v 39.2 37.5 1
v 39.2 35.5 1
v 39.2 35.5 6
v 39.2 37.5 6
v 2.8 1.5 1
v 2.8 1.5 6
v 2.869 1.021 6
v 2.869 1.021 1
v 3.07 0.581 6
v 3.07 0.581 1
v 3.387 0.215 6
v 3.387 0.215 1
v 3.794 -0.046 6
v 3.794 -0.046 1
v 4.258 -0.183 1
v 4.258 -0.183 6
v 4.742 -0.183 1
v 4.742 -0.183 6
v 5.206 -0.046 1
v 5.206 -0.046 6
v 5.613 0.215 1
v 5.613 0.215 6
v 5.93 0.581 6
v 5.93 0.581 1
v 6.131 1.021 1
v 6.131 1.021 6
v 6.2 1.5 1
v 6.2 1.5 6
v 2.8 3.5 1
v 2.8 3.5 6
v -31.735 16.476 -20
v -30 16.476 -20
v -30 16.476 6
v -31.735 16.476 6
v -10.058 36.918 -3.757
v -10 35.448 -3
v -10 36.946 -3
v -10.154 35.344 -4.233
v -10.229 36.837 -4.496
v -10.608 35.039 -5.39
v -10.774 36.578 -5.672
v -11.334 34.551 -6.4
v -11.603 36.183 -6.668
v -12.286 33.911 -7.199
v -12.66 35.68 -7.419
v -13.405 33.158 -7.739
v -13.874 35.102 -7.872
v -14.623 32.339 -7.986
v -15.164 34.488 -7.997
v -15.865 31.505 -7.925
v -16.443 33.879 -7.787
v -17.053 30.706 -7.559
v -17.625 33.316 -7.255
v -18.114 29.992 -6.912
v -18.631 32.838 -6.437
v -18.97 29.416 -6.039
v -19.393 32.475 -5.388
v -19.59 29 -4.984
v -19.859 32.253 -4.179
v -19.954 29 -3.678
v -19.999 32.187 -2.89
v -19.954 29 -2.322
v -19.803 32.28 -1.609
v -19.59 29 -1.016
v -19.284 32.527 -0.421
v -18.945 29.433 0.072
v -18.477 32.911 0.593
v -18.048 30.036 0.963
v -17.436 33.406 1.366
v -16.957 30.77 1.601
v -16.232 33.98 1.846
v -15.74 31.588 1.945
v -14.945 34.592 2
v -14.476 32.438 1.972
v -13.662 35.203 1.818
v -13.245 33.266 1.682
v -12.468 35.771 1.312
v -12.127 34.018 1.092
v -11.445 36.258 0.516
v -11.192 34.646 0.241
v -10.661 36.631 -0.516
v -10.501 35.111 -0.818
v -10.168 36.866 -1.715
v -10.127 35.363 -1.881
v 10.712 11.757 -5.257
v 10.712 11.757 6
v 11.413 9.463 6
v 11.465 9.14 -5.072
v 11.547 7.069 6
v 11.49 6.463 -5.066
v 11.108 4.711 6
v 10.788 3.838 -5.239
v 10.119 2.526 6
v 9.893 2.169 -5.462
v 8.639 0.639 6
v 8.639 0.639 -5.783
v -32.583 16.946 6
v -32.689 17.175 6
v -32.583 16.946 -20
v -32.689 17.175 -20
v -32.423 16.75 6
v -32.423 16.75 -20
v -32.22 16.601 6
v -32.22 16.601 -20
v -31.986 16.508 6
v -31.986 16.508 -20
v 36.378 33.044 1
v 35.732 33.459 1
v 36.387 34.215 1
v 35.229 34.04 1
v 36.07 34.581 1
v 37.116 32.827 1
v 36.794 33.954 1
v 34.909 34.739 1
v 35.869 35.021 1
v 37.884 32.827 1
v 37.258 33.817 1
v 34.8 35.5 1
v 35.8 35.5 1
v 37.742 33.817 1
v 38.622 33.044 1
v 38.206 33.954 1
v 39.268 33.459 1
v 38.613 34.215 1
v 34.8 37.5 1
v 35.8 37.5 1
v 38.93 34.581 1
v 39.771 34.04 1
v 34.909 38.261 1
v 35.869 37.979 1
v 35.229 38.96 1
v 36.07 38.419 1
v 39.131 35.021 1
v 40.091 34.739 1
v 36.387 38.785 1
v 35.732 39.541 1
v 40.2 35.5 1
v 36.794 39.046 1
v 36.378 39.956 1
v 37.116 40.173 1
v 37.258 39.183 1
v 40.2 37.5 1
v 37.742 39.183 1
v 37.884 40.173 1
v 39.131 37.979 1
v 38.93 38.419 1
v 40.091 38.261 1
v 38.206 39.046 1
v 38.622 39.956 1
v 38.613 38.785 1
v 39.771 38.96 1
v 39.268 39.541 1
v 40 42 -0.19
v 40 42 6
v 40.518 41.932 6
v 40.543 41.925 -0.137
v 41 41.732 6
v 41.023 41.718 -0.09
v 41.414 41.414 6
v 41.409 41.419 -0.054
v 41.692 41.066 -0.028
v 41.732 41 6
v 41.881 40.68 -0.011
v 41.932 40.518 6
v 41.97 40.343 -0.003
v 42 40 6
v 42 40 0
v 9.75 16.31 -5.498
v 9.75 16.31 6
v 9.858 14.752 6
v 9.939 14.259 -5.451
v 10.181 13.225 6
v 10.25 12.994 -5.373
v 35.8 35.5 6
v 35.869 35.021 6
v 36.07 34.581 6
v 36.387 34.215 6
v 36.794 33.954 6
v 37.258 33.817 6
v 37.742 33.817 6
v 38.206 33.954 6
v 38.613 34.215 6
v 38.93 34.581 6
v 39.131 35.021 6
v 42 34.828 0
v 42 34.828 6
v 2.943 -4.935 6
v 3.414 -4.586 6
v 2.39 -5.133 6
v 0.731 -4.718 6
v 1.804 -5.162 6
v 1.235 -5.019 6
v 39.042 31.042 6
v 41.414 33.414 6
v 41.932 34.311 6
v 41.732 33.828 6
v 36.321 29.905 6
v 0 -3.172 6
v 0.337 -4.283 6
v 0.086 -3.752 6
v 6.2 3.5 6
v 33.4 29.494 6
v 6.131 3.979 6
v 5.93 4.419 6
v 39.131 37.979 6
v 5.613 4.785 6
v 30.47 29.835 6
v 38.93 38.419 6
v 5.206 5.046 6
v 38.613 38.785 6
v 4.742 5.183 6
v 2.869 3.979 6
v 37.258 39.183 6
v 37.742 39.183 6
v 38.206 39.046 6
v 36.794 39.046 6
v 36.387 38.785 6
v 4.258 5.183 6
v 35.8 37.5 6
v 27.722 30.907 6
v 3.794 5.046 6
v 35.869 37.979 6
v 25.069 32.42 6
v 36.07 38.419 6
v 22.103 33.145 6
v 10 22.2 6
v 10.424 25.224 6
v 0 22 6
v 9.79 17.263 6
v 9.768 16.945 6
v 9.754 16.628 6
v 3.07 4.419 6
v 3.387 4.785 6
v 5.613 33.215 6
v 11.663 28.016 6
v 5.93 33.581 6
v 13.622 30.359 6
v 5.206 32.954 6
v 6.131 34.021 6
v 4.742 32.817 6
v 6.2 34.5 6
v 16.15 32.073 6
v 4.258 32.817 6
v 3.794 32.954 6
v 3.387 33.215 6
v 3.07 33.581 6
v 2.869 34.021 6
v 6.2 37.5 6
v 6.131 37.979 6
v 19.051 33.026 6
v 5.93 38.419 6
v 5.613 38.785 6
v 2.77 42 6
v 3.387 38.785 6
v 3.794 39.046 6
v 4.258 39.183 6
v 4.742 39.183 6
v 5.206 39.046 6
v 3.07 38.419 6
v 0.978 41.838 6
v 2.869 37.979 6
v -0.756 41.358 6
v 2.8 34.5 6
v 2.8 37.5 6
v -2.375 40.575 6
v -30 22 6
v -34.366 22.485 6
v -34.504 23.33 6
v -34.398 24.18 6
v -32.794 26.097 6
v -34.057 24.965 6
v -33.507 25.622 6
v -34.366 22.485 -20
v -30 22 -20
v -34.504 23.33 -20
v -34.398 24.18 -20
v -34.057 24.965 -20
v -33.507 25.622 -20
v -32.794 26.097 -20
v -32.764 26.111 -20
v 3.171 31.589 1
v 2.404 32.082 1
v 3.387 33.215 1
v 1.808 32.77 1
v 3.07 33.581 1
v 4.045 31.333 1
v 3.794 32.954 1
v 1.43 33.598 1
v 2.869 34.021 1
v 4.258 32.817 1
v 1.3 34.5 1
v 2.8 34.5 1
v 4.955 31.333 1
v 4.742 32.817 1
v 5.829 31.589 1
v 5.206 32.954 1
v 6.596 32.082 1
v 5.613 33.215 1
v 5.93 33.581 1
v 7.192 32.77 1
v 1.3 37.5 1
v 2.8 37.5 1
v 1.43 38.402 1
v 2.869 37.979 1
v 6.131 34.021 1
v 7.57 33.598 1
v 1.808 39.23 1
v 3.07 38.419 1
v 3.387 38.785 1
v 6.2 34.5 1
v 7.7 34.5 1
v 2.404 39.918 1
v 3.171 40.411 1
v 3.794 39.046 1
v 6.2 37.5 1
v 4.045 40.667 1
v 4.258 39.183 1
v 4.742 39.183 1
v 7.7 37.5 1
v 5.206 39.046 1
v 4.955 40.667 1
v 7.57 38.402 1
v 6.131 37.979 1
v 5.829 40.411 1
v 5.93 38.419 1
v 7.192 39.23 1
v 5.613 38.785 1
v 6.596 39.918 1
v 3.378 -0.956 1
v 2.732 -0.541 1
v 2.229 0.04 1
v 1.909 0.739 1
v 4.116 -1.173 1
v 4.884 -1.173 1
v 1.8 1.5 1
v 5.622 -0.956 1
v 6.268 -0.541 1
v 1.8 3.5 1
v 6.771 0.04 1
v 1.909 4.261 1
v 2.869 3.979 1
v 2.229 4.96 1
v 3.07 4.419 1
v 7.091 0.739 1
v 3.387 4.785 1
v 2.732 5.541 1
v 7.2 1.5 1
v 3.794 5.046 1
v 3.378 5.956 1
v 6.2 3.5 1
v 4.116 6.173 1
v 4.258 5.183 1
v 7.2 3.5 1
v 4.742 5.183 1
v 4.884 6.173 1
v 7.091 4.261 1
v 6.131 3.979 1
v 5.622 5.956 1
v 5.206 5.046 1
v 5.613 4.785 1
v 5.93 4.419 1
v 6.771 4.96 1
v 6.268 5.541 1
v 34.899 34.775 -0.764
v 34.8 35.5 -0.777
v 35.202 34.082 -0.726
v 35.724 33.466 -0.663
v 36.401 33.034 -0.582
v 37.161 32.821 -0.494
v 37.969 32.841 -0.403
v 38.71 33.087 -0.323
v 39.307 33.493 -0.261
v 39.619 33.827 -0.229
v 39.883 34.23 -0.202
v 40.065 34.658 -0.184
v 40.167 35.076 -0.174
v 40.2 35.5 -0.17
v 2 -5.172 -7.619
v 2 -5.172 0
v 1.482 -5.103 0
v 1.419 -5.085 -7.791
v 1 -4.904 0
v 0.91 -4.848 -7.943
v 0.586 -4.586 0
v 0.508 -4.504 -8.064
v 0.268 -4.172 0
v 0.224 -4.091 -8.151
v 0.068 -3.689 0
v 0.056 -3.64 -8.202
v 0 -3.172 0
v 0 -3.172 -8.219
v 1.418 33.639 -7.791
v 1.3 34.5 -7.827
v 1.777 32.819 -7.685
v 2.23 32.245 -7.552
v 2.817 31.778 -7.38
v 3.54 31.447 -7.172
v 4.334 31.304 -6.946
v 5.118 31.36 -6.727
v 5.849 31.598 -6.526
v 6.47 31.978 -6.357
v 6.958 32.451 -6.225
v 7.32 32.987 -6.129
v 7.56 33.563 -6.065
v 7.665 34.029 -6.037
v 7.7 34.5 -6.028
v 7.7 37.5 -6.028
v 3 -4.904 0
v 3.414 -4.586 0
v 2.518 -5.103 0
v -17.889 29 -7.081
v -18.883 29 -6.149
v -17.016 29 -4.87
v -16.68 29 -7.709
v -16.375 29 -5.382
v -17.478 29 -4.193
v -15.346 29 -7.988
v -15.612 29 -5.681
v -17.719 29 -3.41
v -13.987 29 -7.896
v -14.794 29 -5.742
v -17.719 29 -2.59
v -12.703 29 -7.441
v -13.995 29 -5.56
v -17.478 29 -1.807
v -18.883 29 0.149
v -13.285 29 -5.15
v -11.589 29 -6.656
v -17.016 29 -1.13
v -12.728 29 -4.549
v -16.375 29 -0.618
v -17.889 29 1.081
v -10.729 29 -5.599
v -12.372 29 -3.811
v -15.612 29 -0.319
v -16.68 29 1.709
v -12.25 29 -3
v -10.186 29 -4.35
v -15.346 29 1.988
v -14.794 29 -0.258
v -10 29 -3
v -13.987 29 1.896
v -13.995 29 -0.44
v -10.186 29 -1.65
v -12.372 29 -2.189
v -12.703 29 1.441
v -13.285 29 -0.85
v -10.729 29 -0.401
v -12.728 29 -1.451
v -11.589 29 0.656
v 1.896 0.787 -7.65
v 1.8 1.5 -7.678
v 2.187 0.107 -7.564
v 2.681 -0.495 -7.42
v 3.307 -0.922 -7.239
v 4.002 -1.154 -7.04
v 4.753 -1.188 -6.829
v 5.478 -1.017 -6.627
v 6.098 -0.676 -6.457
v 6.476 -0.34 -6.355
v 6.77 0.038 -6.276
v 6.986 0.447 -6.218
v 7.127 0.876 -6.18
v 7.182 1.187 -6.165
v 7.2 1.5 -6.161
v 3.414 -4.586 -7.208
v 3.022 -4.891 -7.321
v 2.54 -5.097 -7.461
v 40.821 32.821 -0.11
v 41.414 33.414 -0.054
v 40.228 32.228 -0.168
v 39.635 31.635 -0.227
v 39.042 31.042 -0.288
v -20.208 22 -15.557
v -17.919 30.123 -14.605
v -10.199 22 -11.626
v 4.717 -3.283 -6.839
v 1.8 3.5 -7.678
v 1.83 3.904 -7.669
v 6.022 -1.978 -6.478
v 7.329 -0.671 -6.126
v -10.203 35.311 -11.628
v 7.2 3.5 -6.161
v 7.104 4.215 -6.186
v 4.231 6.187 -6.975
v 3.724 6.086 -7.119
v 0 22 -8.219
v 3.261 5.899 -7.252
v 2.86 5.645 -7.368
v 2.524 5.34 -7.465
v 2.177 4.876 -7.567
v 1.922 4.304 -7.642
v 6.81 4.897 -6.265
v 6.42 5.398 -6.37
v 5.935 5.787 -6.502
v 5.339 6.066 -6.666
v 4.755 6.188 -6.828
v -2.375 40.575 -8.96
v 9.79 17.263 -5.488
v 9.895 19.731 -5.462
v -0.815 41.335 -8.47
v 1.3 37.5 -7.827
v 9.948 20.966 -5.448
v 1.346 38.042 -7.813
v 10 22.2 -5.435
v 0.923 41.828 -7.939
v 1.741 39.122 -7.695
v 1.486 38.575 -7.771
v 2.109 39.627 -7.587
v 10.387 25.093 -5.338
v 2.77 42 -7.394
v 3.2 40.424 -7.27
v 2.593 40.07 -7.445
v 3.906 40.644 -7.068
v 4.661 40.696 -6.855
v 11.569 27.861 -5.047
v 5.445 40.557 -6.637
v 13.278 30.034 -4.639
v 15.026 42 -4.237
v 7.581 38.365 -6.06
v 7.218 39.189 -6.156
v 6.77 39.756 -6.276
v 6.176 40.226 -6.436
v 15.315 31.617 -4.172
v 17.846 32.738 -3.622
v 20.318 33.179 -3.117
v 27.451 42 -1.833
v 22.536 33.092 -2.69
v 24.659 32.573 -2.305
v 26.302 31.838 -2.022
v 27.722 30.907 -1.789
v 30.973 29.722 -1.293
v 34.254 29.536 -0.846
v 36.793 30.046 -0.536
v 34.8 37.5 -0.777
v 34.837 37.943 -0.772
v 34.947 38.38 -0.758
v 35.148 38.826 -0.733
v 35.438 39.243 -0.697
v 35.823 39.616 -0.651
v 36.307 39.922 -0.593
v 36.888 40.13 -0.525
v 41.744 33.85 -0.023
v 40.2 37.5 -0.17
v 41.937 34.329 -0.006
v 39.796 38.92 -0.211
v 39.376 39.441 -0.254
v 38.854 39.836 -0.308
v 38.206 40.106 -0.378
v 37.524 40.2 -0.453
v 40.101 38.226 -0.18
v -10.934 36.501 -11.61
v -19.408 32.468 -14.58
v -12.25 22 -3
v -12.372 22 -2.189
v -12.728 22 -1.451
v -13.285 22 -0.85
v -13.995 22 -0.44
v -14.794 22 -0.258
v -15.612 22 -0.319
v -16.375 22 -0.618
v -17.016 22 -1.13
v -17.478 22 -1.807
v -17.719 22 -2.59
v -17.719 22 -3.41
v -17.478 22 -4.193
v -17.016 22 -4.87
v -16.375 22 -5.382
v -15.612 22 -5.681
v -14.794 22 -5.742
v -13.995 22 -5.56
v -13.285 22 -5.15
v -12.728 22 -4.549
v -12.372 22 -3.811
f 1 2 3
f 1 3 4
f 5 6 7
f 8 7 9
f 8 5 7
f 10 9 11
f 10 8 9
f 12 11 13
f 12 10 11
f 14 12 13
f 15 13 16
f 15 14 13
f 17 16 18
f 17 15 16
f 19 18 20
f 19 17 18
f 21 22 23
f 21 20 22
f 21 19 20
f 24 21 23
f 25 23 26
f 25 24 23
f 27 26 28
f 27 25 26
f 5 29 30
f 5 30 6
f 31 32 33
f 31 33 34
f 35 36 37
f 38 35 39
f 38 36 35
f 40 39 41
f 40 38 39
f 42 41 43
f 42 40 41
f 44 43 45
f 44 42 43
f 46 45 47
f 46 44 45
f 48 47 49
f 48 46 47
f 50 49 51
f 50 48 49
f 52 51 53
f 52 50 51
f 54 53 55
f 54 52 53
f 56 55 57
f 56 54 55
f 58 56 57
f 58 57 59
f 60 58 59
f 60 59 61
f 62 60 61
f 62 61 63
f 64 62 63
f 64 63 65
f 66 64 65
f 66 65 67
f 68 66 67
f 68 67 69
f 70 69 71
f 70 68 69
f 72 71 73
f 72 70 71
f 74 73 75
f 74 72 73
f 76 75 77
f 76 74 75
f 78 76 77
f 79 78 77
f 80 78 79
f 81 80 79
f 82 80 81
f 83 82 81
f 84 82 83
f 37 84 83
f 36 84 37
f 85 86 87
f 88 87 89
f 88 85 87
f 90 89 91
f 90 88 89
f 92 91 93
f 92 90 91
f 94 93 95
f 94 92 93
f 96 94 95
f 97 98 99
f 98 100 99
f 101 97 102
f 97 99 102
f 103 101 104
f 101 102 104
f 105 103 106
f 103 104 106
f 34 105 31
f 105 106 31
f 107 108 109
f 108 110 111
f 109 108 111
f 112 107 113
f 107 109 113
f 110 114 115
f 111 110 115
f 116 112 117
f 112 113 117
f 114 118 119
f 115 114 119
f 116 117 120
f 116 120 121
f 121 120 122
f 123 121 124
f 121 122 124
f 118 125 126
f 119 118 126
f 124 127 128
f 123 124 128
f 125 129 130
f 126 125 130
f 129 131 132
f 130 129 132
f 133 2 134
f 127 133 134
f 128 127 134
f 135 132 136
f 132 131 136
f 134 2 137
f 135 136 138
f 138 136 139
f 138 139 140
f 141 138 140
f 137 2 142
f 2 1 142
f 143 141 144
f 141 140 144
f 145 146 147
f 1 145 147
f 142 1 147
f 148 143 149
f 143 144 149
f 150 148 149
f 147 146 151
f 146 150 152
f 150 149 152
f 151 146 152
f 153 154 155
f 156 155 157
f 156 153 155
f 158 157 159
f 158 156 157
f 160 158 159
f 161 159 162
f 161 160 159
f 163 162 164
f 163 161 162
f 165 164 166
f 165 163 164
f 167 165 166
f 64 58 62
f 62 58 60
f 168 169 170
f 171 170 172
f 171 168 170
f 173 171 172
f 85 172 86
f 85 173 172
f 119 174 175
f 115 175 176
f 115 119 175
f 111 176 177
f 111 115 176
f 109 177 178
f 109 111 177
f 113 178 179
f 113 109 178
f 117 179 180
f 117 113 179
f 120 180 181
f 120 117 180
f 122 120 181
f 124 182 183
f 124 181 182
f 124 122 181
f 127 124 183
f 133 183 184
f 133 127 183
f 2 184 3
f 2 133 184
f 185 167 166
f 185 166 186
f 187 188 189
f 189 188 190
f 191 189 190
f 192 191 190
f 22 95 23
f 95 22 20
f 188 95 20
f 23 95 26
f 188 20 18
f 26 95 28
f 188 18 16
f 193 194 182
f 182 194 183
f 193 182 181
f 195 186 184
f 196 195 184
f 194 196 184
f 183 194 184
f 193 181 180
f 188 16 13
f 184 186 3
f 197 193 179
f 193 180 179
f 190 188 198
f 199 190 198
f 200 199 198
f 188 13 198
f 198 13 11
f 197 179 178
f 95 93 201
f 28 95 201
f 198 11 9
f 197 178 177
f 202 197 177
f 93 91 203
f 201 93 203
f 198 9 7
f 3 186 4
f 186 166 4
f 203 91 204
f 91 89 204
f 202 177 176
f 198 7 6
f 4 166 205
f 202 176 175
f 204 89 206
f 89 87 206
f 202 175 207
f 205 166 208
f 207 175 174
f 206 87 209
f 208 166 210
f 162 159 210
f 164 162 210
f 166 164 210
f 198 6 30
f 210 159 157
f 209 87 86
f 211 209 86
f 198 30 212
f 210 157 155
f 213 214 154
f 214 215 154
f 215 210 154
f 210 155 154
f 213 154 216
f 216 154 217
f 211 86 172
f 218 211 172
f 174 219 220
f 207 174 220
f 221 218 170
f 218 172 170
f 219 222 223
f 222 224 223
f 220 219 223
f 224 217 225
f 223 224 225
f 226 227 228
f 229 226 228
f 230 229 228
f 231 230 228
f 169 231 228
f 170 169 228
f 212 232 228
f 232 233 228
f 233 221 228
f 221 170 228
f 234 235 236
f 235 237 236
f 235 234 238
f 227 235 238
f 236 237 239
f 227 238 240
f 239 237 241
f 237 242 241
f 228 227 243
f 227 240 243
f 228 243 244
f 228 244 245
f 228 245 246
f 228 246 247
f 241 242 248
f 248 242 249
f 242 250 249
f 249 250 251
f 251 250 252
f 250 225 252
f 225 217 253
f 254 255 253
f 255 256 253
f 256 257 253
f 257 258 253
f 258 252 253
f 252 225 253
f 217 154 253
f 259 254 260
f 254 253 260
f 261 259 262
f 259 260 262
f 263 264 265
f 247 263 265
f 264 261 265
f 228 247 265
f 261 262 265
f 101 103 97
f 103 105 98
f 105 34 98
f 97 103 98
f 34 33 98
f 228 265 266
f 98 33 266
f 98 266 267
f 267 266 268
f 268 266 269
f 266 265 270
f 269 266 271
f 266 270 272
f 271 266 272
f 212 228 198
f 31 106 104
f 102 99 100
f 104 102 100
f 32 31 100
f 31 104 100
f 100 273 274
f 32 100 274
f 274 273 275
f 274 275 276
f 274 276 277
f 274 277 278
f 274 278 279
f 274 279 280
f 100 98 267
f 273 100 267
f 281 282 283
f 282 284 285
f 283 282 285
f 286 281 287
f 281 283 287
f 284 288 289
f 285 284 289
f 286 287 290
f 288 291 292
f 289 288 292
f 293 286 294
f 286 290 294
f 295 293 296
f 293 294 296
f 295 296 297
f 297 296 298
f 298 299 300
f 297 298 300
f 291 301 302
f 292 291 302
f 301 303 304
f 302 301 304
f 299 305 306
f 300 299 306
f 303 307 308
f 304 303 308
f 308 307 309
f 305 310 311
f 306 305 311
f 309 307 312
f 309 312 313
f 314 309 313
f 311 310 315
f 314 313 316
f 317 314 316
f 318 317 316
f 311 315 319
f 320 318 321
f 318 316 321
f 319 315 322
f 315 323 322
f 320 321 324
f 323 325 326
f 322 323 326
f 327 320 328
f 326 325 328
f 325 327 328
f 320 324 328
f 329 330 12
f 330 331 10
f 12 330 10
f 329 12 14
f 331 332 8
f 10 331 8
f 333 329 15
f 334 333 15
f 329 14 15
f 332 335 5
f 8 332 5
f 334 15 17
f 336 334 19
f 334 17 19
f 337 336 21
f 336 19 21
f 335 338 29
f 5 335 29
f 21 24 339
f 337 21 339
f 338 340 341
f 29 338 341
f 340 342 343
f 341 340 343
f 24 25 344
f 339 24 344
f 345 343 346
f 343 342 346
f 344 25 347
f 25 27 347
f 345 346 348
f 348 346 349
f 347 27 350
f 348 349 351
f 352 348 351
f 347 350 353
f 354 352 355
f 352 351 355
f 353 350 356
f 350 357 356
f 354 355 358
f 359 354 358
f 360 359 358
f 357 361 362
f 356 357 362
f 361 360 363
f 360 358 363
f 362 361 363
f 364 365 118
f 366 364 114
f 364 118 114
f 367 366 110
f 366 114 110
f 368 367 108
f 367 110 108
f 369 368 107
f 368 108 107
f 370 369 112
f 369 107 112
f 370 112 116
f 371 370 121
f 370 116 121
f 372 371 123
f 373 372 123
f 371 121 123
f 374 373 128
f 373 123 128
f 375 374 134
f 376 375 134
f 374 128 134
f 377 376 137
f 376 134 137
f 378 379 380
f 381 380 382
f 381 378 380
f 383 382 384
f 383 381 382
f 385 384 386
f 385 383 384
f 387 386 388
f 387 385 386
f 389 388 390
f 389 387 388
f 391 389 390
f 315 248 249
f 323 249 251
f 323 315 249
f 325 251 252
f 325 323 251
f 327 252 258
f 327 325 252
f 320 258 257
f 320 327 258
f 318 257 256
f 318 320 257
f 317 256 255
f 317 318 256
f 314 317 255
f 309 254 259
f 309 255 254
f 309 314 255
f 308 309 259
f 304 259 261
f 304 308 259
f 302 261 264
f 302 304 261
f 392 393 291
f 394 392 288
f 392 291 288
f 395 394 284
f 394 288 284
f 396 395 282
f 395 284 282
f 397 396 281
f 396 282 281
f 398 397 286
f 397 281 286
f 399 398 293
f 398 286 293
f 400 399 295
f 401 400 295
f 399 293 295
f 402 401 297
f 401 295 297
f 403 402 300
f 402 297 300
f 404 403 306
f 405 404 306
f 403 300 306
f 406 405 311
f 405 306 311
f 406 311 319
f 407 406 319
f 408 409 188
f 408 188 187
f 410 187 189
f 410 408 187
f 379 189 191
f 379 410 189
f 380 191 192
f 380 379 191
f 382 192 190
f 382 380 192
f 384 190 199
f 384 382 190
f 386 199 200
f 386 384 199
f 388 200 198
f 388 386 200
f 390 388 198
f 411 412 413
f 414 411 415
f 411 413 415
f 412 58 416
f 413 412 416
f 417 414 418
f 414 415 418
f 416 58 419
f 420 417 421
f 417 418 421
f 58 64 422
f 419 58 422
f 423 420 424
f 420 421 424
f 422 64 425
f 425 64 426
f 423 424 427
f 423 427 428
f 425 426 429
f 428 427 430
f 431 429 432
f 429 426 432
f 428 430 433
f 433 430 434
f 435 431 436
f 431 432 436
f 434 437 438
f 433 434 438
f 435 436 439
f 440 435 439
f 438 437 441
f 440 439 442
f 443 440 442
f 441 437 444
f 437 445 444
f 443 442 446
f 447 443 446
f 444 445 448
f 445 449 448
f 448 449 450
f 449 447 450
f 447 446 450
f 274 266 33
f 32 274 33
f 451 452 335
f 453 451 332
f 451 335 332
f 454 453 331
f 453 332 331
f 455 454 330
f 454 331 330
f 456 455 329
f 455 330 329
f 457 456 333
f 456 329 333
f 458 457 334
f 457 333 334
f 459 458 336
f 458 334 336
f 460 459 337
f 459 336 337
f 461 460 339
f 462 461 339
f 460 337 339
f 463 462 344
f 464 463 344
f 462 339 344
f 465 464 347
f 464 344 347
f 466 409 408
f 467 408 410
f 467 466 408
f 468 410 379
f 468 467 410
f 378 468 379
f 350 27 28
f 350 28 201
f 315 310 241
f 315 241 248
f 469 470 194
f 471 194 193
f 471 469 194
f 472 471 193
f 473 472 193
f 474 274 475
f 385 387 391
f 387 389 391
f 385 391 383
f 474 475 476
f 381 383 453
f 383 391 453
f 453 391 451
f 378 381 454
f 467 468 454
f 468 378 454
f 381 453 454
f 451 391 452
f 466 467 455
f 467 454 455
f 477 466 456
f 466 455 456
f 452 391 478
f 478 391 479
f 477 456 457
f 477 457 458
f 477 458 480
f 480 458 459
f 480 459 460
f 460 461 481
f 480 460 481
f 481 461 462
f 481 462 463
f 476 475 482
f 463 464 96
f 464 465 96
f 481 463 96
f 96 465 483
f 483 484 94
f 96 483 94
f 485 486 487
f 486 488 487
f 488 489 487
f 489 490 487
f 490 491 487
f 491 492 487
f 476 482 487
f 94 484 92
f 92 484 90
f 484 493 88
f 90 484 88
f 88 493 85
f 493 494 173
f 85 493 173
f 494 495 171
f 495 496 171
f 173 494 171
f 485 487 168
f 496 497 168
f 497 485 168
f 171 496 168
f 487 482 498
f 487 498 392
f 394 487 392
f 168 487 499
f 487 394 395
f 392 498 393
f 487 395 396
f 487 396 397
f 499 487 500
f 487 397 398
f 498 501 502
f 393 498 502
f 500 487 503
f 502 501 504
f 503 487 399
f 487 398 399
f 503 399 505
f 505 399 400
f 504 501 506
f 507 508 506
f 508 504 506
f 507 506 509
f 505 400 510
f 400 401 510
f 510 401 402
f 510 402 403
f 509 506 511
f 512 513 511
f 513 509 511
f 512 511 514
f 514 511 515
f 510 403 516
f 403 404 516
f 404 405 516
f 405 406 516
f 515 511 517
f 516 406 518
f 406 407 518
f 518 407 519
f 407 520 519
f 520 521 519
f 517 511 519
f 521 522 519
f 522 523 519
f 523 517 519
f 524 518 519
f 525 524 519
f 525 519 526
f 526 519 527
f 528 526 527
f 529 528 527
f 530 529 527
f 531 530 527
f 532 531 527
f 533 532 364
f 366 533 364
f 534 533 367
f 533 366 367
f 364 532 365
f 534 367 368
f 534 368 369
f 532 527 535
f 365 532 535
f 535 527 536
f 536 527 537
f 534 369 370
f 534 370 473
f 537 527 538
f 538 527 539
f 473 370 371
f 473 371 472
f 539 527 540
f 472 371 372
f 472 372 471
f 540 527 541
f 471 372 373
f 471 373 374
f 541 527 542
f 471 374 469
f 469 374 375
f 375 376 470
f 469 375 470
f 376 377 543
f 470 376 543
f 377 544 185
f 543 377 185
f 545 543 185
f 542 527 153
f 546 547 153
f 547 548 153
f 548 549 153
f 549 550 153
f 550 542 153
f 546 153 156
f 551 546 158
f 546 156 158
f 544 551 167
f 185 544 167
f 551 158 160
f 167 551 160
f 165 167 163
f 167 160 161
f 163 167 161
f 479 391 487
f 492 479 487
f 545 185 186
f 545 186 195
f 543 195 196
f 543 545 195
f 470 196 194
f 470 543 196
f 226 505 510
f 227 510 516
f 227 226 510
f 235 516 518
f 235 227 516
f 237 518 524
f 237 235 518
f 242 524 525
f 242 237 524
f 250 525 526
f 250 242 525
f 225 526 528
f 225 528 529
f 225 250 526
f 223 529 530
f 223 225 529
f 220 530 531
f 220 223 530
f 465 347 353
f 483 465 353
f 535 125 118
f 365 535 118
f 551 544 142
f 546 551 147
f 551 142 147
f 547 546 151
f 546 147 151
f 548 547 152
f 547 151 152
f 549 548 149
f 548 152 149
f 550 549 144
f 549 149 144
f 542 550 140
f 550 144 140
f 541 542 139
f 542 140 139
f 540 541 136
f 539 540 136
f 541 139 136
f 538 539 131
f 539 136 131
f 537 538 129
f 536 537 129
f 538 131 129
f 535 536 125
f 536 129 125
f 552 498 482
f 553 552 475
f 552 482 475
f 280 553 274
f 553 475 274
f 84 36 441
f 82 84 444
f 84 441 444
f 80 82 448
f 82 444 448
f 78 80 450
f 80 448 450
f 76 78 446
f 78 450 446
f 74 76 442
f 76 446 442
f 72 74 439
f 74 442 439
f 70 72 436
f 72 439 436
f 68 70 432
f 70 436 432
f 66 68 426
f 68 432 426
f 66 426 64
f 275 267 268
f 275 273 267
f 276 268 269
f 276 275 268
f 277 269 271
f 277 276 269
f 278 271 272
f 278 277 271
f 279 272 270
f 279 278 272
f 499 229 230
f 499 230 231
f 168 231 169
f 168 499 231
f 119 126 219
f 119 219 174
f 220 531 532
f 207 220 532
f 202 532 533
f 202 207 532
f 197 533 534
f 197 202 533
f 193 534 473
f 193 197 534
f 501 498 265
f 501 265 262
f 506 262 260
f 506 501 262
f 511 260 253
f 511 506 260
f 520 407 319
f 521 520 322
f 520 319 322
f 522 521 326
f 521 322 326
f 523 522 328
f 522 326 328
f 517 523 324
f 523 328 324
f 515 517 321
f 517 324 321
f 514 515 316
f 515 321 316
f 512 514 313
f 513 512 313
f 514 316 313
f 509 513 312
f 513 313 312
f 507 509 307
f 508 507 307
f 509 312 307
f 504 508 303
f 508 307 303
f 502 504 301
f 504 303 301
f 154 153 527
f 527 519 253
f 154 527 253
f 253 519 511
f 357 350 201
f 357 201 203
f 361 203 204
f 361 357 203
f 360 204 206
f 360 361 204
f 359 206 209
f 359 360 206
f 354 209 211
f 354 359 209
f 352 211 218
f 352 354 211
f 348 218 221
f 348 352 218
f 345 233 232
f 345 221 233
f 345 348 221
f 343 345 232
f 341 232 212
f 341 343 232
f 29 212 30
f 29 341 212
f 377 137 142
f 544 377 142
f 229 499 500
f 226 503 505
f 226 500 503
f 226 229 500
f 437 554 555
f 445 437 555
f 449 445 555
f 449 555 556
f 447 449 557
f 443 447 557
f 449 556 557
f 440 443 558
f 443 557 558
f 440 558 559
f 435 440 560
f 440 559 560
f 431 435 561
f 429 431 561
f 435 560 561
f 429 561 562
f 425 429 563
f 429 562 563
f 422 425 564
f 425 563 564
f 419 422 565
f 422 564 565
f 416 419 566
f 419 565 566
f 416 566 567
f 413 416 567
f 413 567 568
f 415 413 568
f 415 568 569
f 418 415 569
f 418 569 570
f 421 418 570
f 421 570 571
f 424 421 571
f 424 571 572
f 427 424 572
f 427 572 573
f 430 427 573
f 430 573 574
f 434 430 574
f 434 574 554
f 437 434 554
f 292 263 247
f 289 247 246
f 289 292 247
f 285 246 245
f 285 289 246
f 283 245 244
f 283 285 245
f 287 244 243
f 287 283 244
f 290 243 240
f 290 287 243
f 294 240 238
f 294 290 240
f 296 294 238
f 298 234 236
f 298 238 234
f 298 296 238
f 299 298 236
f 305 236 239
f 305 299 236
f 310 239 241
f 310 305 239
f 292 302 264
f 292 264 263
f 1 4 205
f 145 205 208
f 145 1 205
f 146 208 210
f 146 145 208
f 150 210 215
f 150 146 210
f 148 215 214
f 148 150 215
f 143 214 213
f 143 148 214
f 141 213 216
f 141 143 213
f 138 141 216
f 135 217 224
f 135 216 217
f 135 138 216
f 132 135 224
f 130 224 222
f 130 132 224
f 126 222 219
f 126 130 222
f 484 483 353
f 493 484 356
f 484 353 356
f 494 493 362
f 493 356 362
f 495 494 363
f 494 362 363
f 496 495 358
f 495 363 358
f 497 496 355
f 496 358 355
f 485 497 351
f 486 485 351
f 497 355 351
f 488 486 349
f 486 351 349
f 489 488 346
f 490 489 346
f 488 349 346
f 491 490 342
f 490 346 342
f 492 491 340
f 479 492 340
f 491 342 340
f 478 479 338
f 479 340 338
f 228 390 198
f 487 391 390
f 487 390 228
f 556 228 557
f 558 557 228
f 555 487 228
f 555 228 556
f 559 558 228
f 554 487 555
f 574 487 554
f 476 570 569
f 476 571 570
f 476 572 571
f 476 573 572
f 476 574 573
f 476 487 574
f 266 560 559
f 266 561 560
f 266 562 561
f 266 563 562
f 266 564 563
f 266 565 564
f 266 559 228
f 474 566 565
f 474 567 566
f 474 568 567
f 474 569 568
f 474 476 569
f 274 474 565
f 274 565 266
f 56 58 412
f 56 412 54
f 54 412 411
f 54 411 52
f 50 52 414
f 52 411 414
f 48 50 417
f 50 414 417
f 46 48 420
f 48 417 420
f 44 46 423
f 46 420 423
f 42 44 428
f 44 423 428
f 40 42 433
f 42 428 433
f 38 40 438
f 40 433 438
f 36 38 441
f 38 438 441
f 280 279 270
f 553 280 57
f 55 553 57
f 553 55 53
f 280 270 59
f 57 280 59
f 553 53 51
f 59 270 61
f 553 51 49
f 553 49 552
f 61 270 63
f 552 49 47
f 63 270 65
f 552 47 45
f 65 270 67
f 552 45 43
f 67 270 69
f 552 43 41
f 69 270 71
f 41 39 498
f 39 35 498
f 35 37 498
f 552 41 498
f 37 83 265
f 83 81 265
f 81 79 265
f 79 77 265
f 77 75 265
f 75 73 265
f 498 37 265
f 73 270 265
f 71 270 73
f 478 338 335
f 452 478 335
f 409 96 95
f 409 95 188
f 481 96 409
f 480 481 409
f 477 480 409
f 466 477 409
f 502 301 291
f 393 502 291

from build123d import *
from build123d.topology import SkipClean

# Parameters (mm, degrees)
RESSALTO_EXTRUS_O1_DEPTH = 6
RESSALTO_EXTRUS_O2_DEPTH = 47.171573
CORTE_EXTRUS_O1_START    = -36
CORTE_EXTRUS_O1_DEPTH    = 36
CORTE_EXTRUS_O2_START    = -6
CORTE_EXTRUS_O2_DEPTH    = 6
CORTE_EXTRUS_O3_DEPTH    = 64.000000167
ESBO_O6_R                = 2.75
CORTE_EXTRUS_O4_DEPTH    = 54.872946739
ESBO_O7_R                = 5
CORTE_EXTRUS_O5_DEPTH    = 16
RESSALTO_EXTRUS_O3_DEPTH = 56
CORTE_EXTRUS_O6_DEPTH    = 56
ESBO_O10_W               = 30
ESBO_O10_H               = 4.954017116
CORTE_EXTRUS_O7_DEPTH    = 56
ESBO_O11_W               = 2.729993951
ESBO_O11_H               = 30
CORTE_EXTRUS_O8_DEPTH    = 56
ESBO_O12_W               = 4.187219241
ESBO_O12_H               = 30
CORTE_EXTRUS_O9_DEPTH    = 56
ESBO_O13_R               = 7.968110823
CORTE_EXTRUS_O10_DEPTH   = 56
FILETE1_R                = 3
FILETE2_R                = 1
ESBO_O14_R               = 5
CORTE_EXTRUS_O11_DEPTH   = 56
CORTE_EXTRUS_O12_DEPTH   = 65.838260479


with BuildPart() as part:
    # Esboço1 → Ressalto-extrusão1 (new body)
    with BuildSketch(Plane.XY):
        with BuildLine():
            Line((-30, 24), (-2.375117905, 40.574929257))
            ThreePointArc((-2.375117905, 40.574929257), (0.100503831, 41.637149282), (2.769839649, 42))
            Line((2.769839649, 42), (40, 42))
            ThreePointArc((40, 42), (41.414213562, 41.414213562), (42, 40))
            Line((42, 40), (42, 34.828427125))
            ThreePointArc((42, 34.828427125), (41.847759065, 34.06306026), (41.414213562, 33.414213562))
            Line((41.414213562, 33.414213562), (36.670641482, 28.670641482))
            ThreePointArc((36.670641482, 28.670641482), (31.432958847, 25.911210894), (25.552715472, 26.597151419))
            ThreePointArc((25.552715472, 26.597151419), (13.045048712, 24.264475098), (10.712372391, 11.756808337))
            ThreePointArc((10.712372391, 11.756808337), (11.398312916, 5.876564962), (8.638882328, 0.638882328))
            Line((8.638882328, 0.638882328), (8, 0))
            Line((8, 0), (6.2, -1.8))
            Line((6.2, -1.8), (3.414213562, -4.585786438))
            ThreePointArc((3.414213562, -4.585786438), (1.234633135, -5.01933194), (0, -3.171572875))
            Line((0, -3.171572875), (0, 0))
            Line((0, 0), (0, 22))
            Line((0, 22), (-30, 22))
            Line((-30, 22), (-30, 24))
        make_face()
        with BuildLine():
            Line((6.2, 37.5), (6.2, 34.5))
            ThreePointArc((6.2, 34.5), (4.5, 32.8), (2.8, 34.5))
            Line((2.8, 34.5), (2.8, 37.5))
            ThreePointArc((2.8, 37.5), (4.5, 39.2), (6.2, 37.5))
        make_face(mode=Mode.SUBTRACT)
        with BuildLine():
            Line((39.2, 37.5), (39.2, 35.5))
            ThreePointArc((39.2, 35.5), (37.5, 33.8), (35.8, 35.5))
            Line((35.8, 35.5), (35.8, 37.5))
            ThreePointArc((35.8, 37.5), (37.5, 39.2), (39.2, 37.5))
        make_face(mode=Mode.SUBTRACT)
        with BuildLine():
            Line((6.2, 3.5), (6.2, 1.5))
            ThreePointArc((6.2, 1.5), (4.5, -0.2), (2.8, 1.5))
            Line((2.8, 1.5), (2.8, 3.5))
            ThreePointArc((2.8, 3.5), (4.5, 5.2), (6.2, 3.5))
        make_face(mode=Mode.SUBTRACT)
    extrude(amount=RESSALTO_EXTRUS_O1_DEPTH)

    # Esboço2 → Ressalto-extrusão2 (add, through all)
    with BuildSketch(Plane(origin=(0, 42, 0), x_dir=(1, 0, 0), z_dir=(0, 1, 0))):
        with BuildLine():
            Line((-30, 0), (-30, 20))
            ThreePointArc((-30, 20), (5.092783278, 6.734019802), (42, 0))
            Line((42, 0), (-30, 0))
        make_face()
    extrude(amount=-RESSALTO_EXTRUS_O2_DEPTH)

    # Esboço3 → Corte-extrusão1 (cut)
    with BuildSketch(Plane.XY.offset(CORTE_EXTRUS_O1_START)):
        with BuildLine():
            ThreePointArc((2.8, 34.5), (4.5, 32.8), (6.2, 34.5))
            Line((6.2, 34.5), (6.2, 37.5))
            ThreePointArc((6.2, 37.5), (4.5, 39.2), (2.8, 37.5))
            Line((2.8, 37.5), (2.8, 34.5))
        make_face()
        with BuildLine():
            Line((0, -3.171572875), (0, 22))
            Line((0, 22), (-30, 22))
            Line((-30, 22), (-30, -5.171572875))
            Line((-30, -5.171572875), (2, -5.171572875))
            ThreePointArc((2, -5.171572875), (0.585786438, -4.585786438), (0, -3.171572875))
        make_face()
        with BuildLine():
            ThreePointArc((3.414213562, -4.585786438), (2.765366865, -5.01933194), (2, -5.171572875))
            Line((2, -5.171572875), (42, -5.171572875))
            Line((42, -5.171572875), (42, 34.828427125))
            ThreePointArc((42, 34.828427125), (41.847759065, 34.06306026), (41.414213562, 33.414213562))
            Line((41.414213562, 33.414213562), (36.670641482, 28.670641482))
            ThreePointArc((36.670641482, 28.670641482), (31.432958847, 25.911210894), (25.552715472, 26.597151419))
            ThreePointArc((25.552715472, 26.597151419), (13.045048712, 24.264475098), (10.712372391, 11.756808337))
            ThreePointArc((10.712372391, 11.756808337), (11.398312916, 5.876564962), (8.638882328, 0.638882328))
            Line((8.638882328, 0.638882328), (3.414213562, -4.585786438))
        make_face()
        with BuildLine():
            ThreePointArc((35.8, 35.5), (37.5, 33.8), (39.2, 35.5))
            Line((39.2, 35.5), (39.2, 37.5))
            ThreePointArc((39.2, 37.5), (37.5, 39.2), (35.8, 37.5))
            Line((35.8, 37.5), (35.8, 35.5))
        make_face()
        with BuildLine():
            ThreePointArc((2.8, 1.5), (4.5, -0.2), (6.2, 1.5))
            Line((6.2, 1.5), (6.2, 3.5))
            ThreePointArc((6.2, 3.5), (4.5, 5.2), (2.8, 3.5))
            Line((2.8, 3.5), (2.8, 1.5))
        make_face()
        with BuildLine():
            Line((-30, 42), (-30, 24))
            Line((-30, 24), (-2.375117905, 40.574929257))
            ThreePointArc((-2.375117905, 40.574929257), (0.100503831, 41.637149282), (2.769839649, 42))
            Line((2.769839649, 42), (-30, 42))
        make_face()
    extrude(amount=CORTE_EXTRUS_O1_DEPTH, mode=Mode.SUBTRACT)

    # Esboço4 → Corte-extrusão2 (cut)
    with BuildSketch(Plane.XY.offset(CORTE_EXTRUS_O2_START)):
        with BuildLine():
            Line((42, 40), (42, 42))
            Line((42, 42), (40, 42))
            ThreePointArc((40, 42), (41.414213562, 41.414213562), (42, 40))
        make_face()
    extrude(amount=CORTE_EXTRUS_O2_DEPTH, mode=Mode.SUBTRACT)

    # Esboço5 → Corte-extrusão3 (cut, through all)
    with BuildSketch(Plane.XY.offset(1)):
        with BuildLine():
            Line((1.3, 37.5), (1.3, 34.5))
            ThreePointArc((1.3, 34.5), (4.5, 31.3), (7.7, 34.5))
            Line((7.7, 34.5), (7.7, 37.5))
            ThreePointArc((7.7, 37.5), (4.5, 40.7), (1.3, 37.5))
        make_face()
        with BuildLine():
            Line((40.2, 35.5), (40.2, 37.5))
            ThreePointArc((40.2, 37.5), (37.5, 40.2), (34.8, 37.5))
            Line((34.8, 37.5), (34.8, 35.5))
            ThreePointArc((34.8, 35.5), (37.5, 32.8), (40.2, 35.5))
        make_face()
        with BuildLine():
            Line((1.8, 3.5), (1.8, 1.5))
            ThreePointArc((1.8, 1.5), (4.5, -1.2), (7.2, 1.5))
            Line((7.2, 1.5), (7.2, 3.5))
            ThreePointArc((7.2, 3.5), (4.5, 6.2), (1.8, 3.5))
        make_face()
    extrude(amount=-CORTE_EXTRUS_O3_DEPTH, mode=Mode.SUBTRACT)

    # Esboço6 → Corte-extrusão4 (cut, through all)
    with BuildSketch(Plane.XZ.offset(-22)):
        with Locations((-15, -3)):
            Circle(ESBO_O6_R)
    extrude(amount=-CORTE_EXTRUS_O4_DEPTH, mode=Mode.SUBTRACT)

    # Esboço7 → Corte-extrusão5 (cut)
    with BuildSketch(Plane(origin=(0, 29, 0), x_dir=(-1, 0, 0), z_dir=(0, -1, 0))):
        with Locations(Location((15, 3, 0), (0, 0, 180))):
            Circle(ESBO_O7_R)
    extrude(amount=-CORTE_EXTRUS_O5_DEPTH, mode=Mode.SUBTRACT)

    # Esboço8 → Ressalto-extrusão3 (add)
    with BuildSketch(Plane.XY.offset(6)):
        Polygon((-30, 22), (-30, 16.475897374), (-32.468121282, 16.475897374), (-35.151943697, 24.974668355), (-2.375117905, 40.574929257), align=None)
    extrude(amount=-RESSALTO_EXTRUS_O3_DEPTH)

    # Esboço9 → Corte-extrusão6 (cut)
    with BuildSketch(Plane(origin=(-19.527562648, 29.041651157, 0), x_dir=(0.8298484461977135, 0.5579888496585221, 0), z_dir=(0.5579888496585221, -0.8298484461977135, 0))):
        with BuildLine():
            Line((20.669370198, -50), (20.669370198, -8.960218673))
            add(Edge.make_bspline(
                [(20.669370198, -8.960218673), (3.547051305, -13.487974371), (-12.619698693, -20)],
                knots=[1.879279318, 1.879279318, 1.879279318, 2.02269118, 2.02269118, 2.02269118], degree=2, weights=[1, 0.997430231, 1]))
            Line((-12.619698693, -20), (-12.619698693, -50))
            Line((-12.619698693, -50), (20.669370198, -50))
        make_face()
    extrude(amount=-CORTE_EXTRUS_O6_DEPTH, mode=Mode.SUBTRACT)

    # Esboço10 → Corte-extrusão7 (cut)
    with BuildSketch(Plane(origin=(-10.472437352, -7.041651157, 0), x_dir=(0, 0, -1), z_dir=(0.8298484461977135, 0.5579888496585221, 1.5073885260129385e-15))):
        with Locations((35, 37.473339864)):
            Rectangle(ESBO_O10_W, ESBO_O10_H)
    extrude(amount=-CORTE_EXTRUS_O7_DEPTH, mode=Mode.SUBTRACT)

    # Esboço11 → Corte-extrusão8 (cut)
    with BuildSketch(Plane(origin=(-22.291848959, 33.152734563, 0), x_dir=(0.8298484461977135, 0.5579888496585221, 0), z_dir=(0.5579888496585221, -0.8298484461977135, 0))):
        with Locations((-13.984695669, -35)):
            Rectangle(ESBO_O11_W, ESBO_O11_H)
    extrude(amount=-CORTE_EXTRUS_O8_DEPTH, mode=Mode.SUBTRACT)

    # Esboço12 → Corte-extrusão9 (cut)
    with BuildSketch(Plane(origin=(-19.527562648, 29.041651157, 0), x_dir=(0.8298484461977135, 0.5579888496585221, 0), z_dir=(-0.5579888496585221, 0.8298484461977135, 0))):
        with Locations((-14.713308314, 35)):
            Rectangle(ESBO_O12_W, ESBO_O12_H)
    extrude(amount=-CORTE_EXTRUS_O9_DEPTH, mode=Mode.SUBTRACT)

    # Esboço13 → Corte-extrusão10 (cut)
    with BuildSketch(Plane(origin=(0, 0, -20), x_dir=(-1, 0, 0), z_dir=(0, 0, -1))):
        with Locations((34.361612589, 20.650995678)):
            Circle(ESBO_O13_R)
    extrude(amount=CORTE_EXTRUS_O10_DEPTH, mode=Mode.SUBTRACT)

    # Filete1
    filete1_edges = [part.edges().sort_by_distance(p)[0] for p in [
        (-35.151943697, 24.974668355, -7),
    ]]
    fillet(filete1_edges, radius=FILETE1_R)

    # Filete2
    filete2_edges = [part.edges().sort_by_distance(p)[0] for p in [
        (-32.468121282, 16.475897374, -7),
    ]]
    fillet(filete2_edges, radius=FILETE2_R)

    # Esboço14 → Corte-extrusão11 (cut)
    with SkipClean():  # the faces are left unmerged after this step: merging them gives an invalid solid
        with BuildSketch(Plane(origin=(0, 29, 0), x_dir=(1, 0, 0), z_dir=(0, 1, 0))):
            with Locations((-15, 3)):
                Circle(ESBO_O14_R)
        extrude(amount=CORTE_EXTRUS_O11_DEPTH, mode=Mode.SUBTRACT)

    # Esboço15 → Corte-extrusão12 (cut, through all)
    with SkipClean():  # the faces are left unmerged after this step: merging them gives an invalid solid
        with BuildSketch(Plane.XY.offset(6)):
            with BuildLine():
                Line((9.75, 16.30952381), (10, 22.2))
                ThreePointArc((10, 22.2), (16.149553965, 32.072850311), (27.722395139, 30.906859571))
                ThreePointArc((27.722395139, 30.906859571), (33.400143909, 29.493959096), (39.042427522, 31.042427522))
                Line((39.042427522, 31.042427522), (40.056737405, 6.935592927))
                Line((40.056737405, 6.935592927), (14.498143353, 9.675700977))
                Line((14.498143353, 9.675700977), (9.75, 16.30952381))
            make_face()
        extrude(amount=-CORTE_EXTRUS_O12_DEPTH, mode=Mode.SUBTRACT)


solid = part.part
